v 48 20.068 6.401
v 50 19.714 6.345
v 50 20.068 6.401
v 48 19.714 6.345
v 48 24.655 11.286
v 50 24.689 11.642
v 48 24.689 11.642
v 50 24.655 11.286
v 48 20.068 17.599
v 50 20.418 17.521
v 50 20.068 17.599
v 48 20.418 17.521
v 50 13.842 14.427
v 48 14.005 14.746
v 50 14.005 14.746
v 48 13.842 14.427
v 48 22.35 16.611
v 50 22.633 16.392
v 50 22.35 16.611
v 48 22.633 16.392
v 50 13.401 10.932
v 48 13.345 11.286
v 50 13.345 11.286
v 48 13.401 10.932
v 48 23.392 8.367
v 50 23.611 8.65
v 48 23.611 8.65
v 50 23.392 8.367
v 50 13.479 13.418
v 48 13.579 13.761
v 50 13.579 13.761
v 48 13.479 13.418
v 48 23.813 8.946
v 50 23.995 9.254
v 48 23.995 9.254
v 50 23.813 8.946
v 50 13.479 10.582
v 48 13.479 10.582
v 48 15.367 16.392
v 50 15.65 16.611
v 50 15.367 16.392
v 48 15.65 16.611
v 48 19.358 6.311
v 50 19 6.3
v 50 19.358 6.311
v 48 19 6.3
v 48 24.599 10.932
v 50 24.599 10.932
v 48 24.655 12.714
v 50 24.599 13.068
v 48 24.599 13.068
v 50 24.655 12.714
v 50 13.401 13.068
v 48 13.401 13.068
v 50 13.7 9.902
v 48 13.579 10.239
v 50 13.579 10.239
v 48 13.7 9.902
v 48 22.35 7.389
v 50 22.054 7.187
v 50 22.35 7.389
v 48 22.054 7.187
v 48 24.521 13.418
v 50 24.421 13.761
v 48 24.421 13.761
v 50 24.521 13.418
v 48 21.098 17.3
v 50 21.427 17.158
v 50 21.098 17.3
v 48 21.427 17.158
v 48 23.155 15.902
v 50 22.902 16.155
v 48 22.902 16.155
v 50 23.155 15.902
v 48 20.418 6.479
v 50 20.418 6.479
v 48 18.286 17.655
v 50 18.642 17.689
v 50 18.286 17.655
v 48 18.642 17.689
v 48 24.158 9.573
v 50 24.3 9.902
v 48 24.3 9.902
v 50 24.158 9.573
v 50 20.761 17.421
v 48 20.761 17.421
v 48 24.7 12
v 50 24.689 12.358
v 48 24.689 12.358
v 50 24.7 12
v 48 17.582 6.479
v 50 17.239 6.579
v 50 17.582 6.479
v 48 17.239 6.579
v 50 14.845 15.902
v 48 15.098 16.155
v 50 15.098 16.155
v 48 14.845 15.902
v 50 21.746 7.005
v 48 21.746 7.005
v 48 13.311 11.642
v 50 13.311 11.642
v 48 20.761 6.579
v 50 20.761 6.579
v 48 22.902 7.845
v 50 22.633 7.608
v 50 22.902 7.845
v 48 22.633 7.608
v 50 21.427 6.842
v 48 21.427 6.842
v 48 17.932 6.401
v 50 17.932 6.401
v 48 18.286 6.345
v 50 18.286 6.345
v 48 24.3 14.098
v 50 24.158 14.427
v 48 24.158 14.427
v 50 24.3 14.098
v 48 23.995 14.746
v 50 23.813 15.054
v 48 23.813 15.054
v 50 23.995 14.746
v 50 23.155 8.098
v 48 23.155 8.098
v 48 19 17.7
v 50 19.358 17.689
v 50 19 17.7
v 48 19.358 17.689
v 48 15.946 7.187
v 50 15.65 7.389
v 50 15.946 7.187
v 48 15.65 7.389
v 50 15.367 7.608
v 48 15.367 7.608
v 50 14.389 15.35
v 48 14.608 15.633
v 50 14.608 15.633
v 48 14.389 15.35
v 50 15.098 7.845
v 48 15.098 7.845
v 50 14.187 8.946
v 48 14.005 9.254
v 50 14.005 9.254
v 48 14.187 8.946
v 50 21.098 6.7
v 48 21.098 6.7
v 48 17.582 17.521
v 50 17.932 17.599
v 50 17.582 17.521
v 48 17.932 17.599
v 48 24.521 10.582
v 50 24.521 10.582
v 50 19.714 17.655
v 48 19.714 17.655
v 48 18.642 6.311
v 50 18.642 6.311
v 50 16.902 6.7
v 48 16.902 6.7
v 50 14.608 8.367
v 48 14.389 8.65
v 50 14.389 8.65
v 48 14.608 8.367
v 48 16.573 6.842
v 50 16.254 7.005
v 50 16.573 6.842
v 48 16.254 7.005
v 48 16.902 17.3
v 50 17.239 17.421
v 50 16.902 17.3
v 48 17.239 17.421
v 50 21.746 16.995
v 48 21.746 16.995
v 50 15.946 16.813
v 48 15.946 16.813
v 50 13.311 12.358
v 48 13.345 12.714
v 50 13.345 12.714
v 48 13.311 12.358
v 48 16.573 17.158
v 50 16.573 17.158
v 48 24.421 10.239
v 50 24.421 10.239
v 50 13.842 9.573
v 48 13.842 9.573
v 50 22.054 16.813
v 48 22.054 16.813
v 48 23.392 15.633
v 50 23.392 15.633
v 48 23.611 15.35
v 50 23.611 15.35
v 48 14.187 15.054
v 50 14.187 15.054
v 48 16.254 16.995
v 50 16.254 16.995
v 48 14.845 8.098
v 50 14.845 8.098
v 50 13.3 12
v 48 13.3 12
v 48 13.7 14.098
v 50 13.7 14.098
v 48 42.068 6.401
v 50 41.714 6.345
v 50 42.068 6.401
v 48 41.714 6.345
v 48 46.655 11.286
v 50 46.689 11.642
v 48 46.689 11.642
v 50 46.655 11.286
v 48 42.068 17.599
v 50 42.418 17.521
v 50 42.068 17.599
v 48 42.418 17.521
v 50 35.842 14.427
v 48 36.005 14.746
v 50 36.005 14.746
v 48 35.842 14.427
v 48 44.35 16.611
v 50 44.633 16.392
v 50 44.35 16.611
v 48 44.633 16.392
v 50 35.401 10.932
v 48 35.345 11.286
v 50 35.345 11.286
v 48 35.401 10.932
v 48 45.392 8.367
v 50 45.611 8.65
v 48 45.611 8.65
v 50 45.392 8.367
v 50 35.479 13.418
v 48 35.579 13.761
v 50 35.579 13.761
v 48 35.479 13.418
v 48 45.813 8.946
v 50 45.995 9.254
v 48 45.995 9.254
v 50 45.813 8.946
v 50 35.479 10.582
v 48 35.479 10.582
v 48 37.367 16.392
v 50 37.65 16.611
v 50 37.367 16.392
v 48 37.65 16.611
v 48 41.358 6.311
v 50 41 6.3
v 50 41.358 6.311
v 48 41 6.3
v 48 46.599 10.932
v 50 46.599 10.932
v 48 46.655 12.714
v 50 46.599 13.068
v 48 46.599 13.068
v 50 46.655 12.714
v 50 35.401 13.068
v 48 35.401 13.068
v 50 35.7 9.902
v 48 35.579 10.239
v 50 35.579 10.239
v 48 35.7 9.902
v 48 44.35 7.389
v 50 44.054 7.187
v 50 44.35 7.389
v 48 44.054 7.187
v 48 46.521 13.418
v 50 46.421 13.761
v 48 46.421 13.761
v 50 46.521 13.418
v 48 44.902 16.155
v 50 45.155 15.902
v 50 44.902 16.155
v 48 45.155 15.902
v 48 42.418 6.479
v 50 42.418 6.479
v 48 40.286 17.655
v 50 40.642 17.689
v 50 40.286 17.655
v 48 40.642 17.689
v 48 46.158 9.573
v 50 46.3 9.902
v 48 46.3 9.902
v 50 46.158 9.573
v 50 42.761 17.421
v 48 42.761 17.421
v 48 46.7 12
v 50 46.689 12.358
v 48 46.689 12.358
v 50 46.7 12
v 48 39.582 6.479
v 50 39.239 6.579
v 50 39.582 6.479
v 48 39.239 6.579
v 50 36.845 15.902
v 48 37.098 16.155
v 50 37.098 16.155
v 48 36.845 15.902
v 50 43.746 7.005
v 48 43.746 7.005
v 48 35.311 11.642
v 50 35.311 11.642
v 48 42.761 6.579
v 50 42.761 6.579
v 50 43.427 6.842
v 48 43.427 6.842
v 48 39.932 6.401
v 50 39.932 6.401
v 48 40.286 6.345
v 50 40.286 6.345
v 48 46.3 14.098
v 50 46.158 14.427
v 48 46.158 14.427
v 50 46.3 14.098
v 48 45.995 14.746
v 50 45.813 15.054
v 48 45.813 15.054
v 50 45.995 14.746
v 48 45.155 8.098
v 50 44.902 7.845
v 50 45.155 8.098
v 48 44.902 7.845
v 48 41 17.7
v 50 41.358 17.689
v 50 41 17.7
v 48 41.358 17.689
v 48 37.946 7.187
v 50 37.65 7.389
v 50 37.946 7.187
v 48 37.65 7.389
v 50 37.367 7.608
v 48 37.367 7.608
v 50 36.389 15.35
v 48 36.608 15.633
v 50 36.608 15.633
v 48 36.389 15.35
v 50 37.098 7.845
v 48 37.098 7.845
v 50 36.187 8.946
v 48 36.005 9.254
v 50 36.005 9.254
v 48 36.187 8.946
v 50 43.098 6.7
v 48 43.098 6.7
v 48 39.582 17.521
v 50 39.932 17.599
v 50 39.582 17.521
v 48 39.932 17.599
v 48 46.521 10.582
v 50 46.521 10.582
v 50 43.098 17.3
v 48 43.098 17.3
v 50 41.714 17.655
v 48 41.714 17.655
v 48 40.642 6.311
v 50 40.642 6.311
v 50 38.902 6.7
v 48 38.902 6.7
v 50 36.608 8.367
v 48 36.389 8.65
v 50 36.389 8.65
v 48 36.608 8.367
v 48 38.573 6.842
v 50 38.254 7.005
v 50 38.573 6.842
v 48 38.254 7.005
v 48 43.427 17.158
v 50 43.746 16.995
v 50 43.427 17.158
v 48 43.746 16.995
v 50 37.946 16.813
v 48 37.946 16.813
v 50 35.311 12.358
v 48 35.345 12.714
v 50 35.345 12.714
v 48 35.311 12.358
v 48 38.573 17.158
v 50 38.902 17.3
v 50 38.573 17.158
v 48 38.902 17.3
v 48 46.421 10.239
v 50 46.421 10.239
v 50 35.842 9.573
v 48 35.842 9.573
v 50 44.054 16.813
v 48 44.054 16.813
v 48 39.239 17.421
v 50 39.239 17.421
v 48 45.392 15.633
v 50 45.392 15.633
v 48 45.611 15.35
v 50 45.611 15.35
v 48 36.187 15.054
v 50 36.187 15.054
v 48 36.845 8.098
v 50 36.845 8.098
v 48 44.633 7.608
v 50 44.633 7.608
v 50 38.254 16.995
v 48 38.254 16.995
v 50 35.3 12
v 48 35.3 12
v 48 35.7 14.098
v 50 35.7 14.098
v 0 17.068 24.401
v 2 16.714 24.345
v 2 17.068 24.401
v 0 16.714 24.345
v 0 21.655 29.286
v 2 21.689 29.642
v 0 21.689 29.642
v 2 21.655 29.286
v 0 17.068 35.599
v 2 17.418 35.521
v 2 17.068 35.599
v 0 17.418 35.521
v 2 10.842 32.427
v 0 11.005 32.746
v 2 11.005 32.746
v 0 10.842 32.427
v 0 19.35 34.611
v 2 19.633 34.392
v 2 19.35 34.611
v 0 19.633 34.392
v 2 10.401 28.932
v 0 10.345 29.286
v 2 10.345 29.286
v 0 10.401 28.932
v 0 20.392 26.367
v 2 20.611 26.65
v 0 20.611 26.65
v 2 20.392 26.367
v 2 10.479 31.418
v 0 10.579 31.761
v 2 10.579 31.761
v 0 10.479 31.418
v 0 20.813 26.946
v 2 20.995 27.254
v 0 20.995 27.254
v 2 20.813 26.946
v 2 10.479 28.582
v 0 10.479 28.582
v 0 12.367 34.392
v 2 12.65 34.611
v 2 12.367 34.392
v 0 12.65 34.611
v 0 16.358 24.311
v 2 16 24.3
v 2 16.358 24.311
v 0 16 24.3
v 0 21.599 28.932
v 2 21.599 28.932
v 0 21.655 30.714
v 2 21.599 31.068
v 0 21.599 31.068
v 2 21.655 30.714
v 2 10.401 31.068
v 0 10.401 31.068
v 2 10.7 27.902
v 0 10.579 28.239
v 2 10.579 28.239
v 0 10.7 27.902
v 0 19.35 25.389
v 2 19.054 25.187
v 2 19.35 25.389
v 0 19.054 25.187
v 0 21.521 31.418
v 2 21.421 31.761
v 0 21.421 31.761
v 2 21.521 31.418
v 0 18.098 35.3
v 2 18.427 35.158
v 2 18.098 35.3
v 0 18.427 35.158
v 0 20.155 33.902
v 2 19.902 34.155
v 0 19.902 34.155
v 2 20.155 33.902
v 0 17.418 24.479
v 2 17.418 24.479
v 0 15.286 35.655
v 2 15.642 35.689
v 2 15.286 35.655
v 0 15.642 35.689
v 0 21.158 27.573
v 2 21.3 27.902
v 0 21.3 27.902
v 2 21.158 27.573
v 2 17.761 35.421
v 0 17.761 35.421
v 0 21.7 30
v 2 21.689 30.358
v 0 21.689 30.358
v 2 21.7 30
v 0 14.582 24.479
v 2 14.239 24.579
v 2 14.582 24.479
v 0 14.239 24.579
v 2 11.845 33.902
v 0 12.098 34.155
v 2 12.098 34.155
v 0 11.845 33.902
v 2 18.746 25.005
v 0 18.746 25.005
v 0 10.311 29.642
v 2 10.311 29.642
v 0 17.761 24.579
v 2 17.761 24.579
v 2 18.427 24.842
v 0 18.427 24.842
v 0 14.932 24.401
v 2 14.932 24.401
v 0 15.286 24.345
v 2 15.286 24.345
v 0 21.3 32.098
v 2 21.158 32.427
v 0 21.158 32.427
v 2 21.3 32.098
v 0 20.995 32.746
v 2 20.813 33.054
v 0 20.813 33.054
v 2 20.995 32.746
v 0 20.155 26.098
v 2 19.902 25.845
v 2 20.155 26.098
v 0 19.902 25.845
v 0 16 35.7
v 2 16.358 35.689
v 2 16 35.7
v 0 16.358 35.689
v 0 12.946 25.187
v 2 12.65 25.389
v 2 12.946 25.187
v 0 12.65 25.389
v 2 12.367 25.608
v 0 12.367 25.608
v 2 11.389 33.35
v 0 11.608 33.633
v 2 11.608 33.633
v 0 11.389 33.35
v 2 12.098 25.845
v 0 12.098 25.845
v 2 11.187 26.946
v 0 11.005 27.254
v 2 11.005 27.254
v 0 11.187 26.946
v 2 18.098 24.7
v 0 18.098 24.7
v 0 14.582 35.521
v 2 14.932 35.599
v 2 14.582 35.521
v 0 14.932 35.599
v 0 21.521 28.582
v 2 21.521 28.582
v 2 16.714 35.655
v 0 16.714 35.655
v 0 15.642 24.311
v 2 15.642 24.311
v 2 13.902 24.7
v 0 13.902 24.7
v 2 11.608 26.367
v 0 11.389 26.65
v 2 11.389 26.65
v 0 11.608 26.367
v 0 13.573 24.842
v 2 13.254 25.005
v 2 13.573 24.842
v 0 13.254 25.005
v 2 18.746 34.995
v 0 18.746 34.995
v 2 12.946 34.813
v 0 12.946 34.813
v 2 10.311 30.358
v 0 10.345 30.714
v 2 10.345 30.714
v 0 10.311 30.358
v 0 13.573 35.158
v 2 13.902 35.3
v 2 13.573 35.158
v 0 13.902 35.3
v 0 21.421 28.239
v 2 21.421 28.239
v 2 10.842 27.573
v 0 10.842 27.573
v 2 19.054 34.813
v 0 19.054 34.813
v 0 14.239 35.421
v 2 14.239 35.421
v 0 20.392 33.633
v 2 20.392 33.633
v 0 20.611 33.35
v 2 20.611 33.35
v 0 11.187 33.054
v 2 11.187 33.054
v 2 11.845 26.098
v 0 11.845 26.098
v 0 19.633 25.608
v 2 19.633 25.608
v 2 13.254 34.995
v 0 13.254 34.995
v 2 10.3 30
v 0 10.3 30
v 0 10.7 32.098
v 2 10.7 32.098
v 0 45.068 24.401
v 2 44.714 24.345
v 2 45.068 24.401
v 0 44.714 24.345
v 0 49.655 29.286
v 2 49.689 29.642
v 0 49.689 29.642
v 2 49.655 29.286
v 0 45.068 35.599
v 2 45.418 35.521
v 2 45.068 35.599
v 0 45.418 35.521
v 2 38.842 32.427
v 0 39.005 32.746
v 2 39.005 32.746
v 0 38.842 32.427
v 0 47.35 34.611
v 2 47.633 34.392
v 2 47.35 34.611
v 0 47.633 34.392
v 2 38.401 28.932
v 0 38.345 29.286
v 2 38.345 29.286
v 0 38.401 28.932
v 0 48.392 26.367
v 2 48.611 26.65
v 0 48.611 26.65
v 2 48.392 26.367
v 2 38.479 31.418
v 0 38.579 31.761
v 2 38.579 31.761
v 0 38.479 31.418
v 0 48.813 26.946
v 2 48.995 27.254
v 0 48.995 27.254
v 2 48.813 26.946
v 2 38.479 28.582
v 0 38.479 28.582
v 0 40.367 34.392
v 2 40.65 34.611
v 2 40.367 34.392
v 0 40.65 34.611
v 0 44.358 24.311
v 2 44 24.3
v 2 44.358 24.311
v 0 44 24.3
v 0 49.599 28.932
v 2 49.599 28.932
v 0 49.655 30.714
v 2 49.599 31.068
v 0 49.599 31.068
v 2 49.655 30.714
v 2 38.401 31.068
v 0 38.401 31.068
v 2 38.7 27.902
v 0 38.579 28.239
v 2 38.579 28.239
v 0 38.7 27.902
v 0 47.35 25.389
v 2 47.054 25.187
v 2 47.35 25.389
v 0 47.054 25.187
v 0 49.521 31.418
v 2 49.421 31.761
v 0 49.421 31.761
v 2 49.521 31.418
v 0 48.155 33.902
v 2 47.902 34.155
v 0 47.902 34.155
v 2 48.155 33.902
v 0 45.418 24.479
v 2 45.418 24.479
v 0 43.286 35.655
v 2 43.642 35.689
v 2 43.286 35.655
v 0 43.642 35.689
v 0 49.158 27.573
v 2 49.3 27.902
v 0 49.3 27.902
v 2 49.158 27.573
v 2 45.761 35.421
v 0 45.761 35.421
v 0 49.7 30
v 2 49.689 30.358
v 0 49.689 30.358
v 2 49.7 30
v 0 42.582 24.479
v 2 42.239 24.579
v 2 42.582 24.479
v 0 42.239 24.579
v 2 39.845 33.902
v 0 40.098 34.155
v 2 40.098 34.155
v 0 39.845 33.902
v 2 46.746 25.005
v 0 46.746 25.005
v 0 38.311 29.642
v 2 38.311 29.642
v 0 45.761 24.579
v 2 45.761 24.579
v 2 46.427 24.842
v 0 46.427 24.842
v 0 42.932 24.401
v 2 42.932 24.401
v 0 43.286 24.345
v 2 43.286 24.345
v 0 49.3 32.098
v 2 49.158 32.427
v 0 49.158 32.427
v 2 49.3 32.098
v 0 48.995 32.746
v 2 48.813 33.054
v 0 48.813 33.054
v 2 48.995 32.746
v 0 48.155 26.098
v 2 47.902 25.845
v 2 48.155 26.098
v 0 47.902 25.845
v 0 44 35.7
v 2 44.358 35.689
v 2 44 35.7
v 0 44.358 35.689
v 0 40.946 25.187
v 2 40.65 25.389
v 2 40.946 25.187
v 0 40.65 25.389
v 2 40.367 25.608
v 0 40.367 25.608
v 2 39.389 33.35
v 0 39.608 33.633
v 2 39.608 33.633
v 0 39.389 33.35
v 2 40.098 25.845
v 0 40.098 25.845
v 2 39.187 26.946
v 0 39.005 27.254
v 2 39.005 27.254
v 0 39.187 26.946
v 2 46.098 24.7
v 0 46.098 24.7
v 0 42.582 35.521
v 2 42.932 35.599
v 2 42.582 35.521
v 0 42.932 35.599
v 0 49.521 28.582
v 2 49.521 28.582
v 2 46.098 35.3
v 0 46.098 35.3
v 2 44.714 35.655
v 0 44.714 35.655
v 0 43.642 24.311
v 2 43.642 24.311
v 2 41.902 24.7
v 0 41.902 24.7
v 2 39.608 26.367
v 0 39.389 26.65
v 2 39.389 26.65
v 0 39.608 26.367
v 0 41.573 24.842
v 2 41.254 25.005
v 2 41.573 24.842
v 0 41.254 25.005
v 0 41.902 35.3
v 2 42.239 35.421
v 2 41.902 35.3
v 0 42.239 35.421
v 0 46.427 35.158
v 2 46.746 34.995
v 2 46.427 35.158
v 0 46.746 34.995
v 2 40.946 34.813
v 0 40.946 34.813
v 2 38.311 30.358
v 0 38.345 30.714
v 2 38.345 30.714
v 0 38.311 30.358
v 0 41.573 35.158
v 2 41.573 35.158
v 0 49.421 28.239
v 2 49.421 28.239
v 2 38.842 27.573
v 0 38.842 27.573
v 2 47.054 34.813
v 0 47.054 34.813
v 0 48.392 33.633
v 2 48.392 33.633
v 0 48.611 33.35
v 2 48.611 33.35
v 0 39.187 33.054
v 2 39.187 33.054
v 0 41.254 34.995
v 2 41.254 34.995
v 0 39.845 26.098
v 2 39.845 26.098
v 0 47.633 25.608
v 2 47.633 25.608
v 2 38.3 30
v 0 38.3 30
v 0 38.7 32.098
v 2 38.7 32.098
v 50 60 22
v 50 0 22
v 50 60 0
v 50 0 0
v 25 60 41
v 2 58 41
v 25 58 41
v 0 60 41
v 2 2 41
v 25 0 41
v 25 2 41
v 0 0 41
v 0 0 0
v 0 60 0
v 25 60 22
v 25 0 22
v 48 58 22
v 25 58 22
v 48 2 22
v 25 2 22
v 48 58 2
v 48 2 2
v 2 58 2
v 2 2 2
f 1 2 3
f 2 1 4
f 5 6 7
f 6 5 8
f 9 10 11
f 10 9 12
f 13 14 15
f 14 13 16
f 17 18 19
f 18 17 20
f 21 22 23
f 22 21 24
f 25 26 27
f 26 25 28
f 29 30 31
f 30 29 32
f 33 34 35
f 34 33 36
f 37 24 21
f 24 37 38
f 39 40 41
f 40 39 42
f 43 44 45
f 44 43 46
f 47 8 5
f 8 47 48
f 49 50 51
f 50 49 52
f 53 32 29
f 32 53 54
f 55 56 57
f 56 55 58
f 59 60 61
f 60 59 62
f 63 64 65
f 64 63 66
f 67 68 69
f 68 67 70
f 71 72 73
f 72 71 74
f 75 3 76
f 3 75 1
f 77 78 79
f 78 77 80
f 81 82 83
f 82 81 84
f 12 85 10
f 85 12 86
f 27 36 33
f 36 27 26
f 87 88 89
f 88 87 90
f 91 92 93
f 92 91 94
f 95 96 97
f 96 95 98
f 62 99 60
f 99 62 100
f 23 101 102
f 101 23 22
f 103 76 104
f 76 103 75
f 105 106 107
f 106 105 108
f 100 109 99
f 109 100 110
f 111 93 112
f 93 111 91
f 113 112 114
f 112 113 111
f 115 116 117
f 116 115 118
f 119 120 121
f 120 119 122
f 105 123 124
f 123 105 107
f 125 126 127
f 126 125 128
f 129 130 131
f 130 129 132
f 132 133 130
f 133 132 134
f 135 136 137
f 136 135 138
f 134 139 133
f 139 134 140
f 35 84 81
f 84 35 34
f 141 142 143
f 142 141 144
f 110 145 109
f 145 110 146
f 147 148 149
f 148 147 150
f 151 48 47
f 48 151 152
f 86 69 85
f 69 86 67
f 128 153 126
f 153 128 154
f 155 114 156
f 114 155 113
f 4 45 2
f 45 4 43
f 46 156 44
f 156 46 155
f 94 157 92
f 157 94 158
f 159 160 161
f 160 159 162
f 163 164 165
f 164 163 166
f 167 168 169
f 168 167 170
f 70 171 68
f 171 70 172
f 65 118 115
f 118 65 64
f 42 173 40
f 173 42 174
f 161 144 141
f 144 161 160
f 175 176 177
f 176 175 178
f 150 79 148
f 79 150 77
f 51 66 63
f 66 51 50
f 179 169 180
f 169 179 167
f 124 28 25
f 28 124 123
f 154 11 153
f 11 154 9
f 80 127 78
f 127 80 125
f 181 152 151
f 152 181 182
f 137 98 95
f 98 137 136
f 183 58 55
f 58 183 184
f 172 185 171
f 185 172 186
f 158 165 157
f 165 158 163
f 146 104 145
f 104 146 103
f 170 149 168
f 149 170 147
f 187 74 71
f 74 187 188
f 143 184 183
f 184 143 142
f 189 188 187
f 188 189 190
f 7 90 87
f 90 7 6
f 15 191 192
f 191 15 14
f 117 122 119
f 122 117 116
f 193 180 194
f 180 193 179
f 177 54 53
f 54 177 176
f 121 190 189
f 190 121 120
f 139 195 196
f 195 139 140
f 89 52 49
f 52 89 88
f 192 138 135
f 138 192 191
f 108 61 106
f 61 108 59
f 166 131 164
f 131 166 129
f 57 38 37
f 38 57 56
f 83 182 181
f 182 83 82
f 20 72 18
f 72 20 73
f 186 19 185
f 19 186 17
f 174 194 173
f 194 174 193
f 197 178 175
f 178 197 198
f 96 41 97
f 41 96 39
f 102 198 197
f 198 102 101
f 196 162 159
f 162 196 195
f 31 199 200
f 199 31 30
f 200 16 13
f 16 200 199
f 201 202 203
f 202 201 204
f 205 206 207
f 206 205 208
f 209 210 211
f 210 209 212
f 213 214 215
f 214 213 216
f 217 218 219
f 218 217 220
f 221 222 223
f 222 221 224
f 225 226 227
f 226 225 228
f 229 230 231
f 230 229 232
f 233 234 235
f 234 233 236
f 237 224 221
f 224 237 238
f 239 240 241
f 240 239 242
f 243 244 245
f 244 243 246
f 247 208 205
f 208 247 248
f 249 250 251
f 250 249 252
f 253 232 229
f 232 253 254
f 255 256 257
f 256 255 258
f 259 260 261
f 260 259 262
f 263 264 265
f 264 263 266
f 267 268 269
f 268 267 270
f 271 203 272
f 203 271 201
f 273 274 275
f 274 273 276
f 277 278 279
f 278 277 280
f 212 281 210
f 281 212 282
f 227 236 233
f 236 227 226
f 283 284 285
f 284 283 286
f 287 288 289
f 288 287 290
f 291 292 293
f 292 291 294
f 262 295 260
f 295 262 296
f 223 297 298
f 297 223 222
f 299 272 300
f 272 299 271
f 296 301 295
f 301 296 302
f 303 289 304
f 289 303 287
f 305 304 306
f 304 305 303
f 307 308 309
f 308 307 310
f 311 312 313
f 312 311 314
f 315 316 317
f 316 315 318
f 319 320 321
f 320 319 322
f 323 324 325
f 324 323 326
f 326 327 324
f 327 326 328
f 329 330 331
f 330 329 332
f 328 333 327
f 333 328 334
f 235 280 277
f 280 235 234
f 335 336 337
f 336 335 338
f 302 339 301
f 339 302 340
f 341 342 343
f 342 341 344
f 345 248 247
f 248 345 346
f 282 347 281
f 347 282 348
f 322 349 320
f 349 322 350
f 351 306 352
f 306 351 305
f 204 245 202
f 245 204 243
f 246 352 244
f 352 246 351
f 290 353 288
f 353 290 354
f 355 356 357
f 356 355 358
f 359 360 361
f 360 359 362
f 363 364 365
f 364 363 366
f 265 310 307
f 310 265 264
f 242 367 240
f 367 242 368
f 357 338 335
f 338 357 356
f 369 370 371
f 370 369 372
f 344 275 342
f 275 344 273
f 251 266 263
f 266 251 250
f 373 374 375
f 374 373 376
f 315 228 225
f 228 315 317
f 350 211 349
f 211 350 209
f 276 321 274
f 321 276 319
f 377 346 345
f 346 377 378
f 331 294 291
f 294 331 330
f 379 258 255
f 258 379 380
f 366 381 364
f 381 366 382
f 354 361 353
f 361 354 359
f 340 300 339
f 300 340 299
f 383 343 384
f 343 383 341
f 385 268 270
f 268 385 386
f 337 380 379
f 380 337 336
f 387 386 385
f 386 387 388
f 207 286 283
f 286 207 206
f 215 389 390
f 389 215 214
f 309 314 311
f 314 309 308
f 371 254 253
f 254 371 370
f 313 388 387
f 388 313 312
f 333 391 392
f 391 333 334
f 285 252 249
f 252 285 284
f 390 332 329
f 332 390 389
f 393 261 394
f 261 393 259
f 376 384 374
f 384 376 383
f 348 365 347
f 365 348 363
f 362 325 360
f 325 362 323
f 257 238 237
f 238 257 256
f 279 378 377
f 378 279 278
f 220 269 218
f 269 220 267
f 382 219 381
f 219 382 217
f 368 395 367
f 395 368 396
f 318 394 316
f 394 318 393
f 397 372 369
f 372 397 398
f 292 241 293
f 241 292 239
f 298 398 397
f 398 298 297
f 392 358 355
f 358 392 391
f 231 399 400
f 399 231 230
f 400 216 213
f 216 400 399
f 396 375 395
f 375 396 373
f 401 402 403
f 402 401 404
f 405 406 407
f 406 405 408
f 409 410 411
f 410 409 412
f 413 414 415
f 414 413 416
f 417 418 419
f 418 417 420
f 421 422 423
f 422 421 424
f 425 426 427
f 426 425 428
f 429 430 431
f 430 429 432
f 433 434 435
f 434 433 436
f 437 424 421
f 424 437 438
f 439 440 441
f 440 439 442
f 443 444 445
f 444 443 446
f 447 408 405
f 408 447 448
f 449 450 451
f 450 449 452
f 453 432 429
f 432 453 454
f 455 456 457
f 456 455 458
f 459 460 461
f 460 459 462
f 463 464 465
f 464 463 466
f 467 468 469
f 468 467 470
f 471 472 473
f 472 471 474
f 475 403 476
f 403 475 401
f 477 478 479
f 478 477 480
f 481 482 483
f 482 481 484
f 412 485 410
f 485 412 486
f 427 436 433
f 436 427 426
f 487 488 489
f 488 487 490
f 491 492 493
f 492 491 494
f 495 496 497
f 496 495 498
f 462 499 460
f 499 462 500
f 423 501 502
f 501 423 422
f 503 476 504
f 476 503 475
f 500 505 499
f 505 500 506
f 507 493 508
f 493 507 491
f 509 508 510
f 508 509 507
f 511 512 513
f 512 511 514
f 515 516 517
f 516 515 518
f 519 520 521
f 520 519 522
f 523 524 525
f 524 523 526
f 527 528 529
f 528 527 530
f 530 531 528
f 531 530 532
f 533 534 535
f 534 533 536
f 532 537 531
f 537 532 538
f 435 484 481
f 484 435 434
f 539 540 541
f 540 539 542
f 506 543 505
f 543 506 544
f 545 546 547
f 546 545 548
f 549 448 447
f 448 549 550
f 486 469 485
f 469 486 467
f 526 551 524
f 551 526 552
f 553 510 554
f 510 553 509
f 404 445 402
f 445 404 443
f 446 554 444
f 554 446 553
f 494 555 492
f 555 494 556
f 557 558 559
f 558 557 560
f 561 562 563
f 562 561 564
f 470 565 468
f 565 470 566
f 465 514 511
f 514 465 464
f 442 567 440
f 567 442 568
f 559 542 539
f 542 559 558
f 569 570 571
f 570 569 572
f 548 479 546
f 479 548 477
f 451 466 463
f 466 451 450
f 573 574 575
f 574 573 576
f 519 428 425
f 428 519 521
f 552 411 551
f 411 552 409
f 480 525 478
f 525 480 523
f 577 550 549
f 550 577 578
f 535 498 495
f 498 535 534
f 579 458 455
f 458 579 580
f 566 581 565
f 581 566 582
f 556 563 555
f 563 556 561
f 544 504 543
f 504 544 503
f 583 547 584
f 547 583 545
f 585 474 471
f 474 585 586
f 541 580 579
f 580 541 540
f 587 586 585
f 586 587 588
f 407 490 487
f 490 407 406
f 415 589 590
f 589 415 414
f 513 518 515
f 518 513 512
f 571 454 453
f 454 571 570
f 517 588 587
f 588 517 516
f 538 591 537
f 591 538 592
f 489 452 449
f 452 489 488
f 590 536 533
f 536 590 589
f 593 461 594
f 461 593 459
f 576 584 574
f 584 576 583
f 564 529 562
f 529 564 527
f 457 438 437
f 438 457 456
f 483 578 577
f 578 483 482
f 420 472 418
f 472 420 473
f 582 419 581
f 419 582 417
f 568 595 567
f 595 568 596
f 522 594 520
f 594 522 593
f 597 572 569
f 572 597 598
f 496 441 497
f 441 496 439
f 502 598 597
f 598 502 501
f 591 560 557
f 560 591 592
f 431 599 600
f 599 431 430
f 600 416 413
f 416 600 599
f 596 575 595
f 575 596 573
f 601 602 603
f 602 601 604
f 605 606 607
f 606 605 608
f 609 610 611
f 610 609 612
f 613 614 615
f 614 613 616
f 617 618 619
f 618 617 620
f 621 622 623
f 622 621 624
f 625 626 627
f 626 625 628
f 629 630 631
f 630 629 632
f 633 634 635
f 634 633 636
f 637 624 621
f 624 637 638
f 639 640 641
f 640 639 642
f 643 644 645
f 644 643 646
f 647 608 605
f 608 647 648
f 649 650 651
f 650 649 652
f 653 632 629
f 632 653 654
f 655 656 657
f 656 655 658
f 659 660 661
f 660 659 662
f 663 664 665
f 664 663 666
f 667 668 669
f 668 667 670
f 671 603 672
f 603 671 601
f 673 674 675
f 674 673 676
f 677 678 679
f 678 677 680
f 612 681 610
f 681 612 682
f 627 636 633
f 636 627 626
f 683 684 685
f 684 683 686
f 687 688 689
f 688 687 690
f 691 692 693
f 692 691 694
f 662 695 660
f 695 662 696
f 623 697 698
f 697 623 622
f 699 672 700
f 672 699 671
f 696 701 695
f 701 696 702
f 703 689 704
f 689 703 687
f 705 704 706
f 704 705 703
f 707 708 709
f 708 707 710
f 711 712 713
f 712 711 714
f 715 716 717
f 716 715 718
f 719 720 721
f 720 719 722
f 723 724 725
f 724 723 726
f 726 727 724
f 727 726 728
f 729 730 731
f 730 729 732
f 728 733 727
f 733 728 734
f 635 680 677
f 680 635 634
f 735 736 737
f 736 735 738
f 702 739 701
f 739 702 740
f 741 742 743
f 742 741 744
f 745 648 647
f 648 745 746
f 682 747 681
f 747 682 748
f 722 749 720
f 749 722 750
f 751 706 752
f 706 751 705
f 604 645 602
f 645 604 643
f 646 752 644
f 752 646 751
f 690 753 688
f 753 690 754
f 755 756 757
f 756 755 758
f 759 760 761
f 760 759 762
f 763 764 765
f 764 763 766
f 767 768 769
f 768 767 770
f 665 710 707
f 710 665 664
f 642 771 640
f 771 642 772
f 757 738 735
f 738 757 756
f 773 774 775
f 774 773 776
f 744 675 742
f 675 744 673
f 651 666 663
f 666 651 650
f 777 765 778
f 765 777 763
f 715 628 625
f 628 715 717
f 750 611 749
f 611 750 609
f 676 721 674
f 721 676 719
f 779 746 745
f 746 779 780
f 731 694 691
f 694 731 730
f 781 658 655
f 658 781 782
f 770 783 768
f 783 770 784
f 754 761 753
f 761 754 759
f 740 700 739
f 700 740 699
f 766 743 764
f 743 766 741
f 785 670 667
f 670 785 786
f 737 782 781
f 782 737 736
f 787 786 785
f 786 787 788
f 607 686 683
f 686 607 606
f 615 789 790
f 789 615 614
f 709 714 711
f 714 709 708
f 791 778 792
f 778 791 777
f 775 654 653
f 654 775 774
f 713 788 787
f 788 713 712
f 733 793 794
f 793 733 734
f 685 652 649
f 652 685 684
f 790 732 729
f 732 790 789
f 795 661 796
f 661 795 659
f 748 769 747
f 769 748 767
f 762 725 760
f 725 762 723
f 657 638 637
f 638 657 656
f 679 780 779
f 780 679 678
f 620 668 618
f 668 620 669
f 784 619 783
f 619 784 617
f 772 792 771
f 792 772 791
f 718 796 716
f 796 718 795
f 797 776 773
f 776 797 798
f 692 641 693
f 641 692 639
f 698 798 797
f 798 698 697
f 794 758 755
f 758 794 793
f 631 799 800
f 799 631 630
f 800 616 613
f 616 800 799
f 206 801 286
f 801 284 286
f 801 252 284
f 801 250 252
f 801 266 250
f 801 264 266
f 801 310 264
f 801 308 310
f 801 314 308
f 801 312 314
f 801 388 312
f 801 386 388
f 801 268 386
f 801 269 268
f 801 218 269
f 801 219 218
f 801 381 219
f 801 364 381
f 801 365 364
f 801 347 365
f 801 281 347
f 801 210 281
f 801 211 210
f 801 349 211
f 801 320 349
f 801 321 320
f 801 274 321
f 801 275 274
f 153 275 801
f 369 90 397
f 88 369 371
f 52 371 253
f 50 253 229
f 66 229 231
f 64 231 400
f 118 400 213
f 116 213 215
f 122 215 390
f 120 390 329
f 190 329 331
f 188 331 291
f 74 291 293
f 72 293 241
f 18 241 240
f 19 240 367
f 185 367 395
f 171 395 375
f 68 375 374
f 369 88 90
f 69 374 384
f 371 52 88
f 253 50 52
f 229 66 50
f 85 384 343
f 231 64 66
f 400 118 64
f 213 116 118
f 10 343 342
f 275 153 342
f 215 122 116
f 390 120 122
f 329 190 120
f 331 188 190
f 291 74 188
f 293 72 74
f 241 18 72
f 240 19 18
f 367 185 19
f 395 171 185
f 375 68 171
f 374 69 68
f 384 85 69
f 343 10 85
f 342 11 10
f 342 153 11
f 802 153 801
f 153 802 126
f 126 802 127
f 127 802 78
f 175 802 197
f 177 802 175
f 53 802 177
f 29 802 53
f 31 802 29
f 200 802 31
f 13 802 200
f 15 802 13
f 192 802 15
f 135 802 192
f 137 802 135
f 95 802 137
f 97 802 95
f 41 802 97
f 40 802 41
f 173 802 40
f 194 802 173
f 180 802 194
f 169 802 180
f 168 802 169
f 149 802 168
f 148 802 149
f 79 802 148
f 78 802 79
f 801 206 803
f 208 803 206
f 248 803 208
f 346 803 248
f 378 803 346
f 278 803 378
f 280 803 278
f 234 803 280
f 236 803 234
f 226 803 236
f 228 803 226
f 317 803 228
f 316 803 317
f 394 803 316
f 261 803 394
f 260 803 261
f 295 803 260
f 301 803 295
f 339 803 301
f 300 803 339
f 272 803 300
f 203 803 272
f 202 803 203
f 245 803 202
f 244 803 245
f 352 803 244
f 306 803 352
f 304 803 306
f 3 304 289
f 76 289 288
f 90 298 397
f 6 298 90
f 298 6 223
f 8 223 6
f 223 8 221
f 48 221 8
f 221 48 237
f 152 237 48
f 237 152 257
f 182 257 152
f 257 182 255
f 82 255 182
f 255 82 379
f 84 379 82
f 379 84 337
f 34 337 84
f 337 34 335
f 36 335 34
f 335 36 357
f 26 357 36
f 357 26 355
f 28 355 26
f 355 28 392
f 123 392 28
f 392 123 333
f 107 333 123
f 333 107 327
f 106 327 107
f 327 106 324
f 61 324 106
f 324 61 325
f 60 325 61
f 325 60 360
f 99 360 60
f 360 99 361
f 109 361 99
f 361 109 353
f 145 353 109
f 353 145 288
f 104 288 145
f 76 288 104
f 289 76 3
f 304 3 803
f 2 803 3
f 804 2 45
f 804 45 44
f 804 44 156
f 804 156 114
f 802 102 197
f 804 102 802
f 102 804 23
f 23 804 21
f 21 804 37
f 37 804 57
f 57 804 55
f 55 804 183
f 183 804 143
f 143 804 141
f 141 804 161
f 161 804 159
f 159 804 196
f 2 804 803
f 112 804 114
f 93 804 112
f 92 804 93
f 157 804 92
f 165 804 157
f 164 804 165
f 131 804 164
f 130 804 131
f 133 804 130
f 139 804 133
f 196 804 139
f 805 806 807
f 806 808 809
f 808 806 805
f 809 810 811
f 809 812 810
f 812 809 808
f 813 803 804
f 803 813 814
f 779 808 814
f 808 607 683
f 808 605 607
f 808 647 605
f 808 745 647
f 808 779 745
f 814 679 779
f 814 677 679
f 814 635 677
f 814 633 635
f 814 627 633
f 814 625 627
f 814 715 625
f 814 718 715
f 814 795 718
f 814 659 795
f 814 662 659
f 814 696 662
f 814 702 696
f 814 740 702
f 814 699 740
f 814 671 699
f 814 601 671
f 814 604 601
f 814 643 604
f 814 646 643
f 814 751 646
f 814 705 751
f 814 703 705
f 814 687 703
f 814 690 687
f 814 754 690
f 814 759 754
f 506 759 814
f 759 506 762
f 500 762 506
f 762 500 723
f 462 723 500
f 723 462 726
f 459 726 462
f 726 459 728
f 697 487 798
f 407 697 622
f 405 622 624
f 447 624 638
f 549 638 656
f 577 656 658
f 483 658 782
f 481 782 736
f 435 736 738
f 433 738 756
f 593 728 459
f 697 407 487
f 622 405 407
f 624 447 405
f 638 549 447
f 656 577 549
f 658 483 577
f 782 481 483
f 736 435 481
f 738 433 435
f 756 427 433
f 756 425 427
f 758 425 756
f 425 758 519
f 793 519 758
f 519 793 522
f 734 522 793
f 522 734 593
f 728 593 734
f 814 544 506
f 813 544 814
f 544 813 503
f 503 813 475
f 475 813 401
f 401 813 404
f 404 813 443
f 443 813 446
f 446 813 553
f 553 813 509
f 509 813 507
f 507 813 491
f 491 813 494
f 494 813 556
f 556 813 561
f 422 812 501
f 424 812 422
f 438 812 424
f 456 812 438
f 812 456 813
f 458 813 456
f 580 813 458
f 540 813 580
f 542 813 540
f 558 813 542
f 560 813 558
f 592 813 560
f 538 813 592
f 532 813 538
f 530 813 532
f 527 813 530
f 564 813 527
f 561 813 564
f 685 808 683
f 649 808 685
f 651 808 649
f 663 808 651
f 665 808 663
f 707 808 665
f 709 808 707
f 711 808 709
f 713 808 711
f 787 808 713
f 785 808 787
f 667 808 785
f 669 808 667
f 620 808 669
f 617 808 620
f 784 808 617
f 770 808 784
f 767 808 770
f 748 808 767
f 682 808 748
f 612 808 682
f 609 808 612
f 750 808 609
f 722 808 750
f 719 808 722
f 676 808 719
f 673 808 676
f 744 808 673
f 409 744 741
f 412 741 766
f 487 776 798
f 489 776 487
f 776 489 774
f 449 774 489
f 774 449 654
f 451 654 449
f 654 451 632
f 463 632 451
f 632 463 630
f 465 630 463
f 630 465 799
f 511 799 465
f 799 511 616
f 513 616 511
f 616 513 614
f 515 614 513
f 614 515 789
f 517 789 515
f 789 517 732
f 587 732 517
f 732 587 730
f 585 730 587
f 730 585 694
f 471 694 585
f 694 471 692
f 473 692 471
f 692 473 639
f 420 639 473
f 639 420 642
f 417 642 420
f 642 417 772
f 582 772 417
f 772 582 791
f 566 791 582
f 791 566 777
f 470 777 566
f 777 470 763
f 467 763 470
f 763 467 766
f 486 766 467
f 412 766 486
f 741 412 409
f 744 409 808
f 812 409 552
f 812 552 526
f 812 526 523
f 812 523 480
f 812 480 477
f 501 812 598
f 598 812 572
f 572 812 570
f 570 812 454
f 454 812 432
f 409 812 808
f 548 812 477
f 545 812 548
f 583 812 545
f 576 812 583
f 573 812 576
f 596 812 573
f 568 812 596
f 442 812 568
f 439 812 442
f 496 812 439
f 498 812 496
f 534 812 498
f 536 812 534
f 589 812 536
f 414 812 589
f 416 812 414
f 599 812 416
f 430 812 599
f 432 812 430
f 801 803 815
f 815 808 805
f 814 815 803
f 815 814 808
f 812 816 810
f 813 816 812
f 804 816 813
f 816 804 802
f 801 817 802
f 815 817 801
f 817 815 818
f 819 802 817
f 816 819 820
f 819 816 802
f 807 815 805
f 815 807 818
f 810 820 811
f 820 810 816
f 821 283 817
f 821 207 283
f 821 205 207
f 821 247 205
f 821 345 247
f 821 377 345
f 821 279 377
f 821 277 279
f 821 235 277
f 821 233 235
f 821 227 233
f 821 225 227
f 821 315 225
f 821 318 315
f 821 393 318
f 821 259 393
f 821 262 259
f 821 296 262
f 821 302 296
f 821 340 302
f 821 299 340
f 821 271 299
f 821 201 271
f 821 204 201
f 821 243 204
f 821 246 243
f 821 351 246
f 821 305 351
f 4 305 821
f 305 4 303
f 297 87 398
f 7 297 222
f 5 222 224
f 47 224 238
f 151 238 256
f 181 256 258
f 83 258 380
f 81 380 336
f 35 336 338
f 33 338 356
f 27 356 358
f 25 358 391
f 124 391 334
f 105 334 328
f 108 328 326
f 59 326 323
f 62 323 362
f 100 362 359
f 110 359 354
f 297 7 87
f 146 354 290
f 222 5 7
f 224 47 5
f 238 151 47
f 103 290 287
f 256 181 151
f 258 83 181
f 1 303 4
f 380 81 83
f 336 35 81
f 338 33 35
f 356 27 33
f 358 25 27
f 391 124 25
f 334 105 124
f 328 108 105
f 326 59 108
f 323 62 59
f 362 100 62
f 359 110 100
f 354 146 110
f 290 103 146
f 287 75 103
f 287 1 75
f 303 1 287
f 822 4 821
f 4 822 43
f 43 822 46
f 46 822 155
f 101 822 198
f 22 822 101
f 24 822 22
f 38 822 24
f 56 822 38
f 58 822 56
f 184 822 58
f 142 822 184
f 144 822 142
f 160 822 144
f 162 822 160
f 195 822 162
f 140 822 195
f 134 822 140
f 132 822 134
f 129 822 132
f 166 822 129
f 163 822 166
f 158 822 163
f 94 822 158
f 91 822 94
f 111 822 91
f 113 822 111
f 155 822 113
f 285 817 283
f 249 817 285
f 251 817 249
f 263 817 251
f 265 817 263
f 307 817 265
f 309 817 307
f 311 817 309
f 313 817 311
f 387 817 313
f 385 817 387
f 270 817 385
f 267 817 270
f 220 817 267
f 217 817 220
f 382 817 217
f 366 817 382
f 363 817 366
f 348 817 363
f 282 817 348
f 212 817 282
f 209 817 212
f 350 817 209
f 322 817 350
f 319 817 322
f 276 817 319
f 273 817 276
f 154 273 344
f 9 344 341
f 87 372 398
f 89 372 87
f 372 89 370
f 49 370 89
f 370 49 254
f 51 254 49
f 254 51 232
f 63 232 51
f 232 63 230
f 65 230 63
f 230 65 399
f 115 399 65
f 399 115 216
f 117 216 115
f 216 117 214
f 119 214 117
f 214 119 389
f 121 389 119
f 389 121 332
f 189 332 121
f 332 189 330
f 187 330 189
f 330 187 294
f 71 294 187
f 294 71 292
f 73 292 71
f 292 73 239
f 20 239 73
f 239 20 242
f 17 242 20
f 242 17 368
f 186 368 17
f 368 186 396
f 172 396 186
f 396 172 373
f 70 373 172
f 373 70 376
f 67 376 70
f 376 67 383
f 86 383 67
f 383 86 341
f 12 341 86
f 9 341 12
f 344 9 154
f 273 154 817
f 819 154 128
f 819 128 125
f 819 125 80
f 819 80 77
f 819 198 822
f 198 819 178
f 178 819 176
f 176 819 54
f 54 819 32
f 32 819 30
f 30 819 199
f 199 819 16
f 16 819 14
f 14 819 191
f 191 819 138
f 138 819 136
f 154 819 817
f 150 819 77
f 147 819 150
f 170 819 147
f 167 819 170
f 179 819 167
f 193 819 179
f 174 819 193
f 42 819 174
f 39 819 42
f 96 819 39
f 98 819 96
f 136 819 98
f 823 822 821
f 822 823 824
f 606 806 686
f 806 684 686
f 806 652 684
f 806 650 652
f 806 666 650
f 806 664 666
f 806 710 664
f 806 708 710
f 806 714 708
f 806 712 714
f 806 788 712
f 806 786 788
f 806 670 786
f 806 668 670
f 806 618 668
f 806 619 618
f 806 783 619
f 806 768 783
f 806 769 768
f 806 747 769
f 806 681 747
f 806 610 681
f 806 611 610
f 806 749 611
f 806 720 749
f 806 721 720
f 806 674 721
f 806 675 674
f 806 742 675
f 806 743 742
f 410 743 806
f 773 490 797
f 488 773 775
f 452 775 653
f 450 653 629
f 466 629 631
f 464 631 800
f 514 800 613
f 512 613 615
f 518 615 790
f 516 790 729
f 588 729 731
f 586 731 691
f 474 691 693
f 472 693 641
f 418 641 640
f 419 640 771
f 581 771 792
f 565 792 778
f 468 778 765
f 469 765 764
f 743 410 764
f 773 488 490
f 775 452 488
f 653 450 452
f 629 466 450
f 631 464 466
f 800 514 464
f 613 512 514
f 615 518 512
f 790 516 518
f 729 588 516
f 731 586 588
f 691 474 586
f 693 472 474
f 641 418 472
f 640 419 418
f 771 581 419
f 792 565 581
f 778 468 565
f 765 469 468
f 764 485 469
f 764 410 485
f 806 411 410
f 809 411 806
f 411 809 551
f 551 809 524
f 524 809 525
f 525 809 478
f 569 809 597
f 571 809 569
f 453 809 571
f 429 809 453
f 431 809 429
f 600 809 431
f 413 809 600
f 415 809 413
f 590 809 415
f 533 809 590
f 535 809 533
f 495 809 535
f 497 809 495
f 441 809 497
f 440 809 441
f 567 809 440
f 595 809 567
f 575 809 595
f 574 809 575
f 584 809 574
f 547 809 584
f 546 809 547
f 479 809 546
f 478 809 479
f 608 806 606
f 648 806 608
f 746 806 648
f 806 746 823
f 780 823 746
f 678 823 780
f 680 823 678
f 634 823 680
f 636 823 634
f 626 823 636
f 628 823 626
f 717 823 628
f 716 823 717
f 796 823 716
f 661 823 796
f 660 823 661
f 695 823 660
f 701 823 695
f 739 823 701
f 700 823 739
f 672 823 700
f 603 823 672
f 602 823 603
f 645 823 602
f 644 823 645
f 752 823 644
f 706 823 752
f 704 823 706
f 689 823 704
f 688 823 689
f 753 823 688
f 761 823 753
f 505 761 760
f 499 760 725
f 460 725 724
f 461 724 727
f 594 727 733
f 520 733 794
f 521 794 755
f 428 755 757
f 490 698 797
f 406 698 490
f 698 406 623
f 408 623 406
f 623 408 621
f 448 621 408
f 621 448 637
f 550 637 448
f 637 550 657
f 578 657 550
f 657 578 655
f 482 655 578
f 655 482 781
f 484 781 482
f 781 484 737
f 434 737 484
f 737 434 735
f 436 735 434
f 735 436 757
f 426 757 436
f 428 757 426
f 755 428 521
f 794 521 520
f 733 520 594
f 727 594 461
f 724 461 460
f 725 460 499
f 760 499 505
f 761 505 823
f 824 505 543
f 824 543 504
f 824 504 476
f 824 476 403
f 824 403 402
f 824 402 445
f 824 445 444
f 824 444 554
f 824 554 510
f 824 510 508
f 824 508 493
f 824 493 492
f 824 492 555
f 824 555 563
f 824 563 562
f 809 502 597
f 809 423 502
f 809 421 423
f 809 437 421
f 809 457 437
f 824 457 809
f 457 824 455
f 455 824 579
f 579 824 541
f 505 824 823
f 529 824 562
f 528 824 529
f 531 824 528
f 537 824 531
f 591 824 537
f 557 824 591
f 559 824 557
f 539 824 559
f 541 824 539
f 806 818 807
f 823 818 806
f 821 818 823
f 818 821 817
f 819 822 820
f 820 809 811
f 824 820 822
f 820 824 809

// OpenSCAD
difference() {
    cube(size = [50, 60, 41]);
    translate([25, -1, 22]) cube(size = [26, 63, 23]);
    translate([2, 2, 2]) cube(size = [46, 56, 40]);
    
    translate([2, 2, 0]) {
        translate([47,17,12]) rotate([0,90,0]) cylinder(h=5, r=5.7, center = true, $fn=100);
        translate([47,39,12]) rotate([0,90,0]) cylinder(h=5, r=5.7, center = true, $fn=100);
        
        translate([-1,14,30]) rotate([0,90,0]) cylinder(h=5, r=5.7, center = true, $fn=100);
        translate([-1,42,30]) rotate([0,90,0]) cylinder(h=5, r=5.7, center = true, $fn=100);
    }
}
